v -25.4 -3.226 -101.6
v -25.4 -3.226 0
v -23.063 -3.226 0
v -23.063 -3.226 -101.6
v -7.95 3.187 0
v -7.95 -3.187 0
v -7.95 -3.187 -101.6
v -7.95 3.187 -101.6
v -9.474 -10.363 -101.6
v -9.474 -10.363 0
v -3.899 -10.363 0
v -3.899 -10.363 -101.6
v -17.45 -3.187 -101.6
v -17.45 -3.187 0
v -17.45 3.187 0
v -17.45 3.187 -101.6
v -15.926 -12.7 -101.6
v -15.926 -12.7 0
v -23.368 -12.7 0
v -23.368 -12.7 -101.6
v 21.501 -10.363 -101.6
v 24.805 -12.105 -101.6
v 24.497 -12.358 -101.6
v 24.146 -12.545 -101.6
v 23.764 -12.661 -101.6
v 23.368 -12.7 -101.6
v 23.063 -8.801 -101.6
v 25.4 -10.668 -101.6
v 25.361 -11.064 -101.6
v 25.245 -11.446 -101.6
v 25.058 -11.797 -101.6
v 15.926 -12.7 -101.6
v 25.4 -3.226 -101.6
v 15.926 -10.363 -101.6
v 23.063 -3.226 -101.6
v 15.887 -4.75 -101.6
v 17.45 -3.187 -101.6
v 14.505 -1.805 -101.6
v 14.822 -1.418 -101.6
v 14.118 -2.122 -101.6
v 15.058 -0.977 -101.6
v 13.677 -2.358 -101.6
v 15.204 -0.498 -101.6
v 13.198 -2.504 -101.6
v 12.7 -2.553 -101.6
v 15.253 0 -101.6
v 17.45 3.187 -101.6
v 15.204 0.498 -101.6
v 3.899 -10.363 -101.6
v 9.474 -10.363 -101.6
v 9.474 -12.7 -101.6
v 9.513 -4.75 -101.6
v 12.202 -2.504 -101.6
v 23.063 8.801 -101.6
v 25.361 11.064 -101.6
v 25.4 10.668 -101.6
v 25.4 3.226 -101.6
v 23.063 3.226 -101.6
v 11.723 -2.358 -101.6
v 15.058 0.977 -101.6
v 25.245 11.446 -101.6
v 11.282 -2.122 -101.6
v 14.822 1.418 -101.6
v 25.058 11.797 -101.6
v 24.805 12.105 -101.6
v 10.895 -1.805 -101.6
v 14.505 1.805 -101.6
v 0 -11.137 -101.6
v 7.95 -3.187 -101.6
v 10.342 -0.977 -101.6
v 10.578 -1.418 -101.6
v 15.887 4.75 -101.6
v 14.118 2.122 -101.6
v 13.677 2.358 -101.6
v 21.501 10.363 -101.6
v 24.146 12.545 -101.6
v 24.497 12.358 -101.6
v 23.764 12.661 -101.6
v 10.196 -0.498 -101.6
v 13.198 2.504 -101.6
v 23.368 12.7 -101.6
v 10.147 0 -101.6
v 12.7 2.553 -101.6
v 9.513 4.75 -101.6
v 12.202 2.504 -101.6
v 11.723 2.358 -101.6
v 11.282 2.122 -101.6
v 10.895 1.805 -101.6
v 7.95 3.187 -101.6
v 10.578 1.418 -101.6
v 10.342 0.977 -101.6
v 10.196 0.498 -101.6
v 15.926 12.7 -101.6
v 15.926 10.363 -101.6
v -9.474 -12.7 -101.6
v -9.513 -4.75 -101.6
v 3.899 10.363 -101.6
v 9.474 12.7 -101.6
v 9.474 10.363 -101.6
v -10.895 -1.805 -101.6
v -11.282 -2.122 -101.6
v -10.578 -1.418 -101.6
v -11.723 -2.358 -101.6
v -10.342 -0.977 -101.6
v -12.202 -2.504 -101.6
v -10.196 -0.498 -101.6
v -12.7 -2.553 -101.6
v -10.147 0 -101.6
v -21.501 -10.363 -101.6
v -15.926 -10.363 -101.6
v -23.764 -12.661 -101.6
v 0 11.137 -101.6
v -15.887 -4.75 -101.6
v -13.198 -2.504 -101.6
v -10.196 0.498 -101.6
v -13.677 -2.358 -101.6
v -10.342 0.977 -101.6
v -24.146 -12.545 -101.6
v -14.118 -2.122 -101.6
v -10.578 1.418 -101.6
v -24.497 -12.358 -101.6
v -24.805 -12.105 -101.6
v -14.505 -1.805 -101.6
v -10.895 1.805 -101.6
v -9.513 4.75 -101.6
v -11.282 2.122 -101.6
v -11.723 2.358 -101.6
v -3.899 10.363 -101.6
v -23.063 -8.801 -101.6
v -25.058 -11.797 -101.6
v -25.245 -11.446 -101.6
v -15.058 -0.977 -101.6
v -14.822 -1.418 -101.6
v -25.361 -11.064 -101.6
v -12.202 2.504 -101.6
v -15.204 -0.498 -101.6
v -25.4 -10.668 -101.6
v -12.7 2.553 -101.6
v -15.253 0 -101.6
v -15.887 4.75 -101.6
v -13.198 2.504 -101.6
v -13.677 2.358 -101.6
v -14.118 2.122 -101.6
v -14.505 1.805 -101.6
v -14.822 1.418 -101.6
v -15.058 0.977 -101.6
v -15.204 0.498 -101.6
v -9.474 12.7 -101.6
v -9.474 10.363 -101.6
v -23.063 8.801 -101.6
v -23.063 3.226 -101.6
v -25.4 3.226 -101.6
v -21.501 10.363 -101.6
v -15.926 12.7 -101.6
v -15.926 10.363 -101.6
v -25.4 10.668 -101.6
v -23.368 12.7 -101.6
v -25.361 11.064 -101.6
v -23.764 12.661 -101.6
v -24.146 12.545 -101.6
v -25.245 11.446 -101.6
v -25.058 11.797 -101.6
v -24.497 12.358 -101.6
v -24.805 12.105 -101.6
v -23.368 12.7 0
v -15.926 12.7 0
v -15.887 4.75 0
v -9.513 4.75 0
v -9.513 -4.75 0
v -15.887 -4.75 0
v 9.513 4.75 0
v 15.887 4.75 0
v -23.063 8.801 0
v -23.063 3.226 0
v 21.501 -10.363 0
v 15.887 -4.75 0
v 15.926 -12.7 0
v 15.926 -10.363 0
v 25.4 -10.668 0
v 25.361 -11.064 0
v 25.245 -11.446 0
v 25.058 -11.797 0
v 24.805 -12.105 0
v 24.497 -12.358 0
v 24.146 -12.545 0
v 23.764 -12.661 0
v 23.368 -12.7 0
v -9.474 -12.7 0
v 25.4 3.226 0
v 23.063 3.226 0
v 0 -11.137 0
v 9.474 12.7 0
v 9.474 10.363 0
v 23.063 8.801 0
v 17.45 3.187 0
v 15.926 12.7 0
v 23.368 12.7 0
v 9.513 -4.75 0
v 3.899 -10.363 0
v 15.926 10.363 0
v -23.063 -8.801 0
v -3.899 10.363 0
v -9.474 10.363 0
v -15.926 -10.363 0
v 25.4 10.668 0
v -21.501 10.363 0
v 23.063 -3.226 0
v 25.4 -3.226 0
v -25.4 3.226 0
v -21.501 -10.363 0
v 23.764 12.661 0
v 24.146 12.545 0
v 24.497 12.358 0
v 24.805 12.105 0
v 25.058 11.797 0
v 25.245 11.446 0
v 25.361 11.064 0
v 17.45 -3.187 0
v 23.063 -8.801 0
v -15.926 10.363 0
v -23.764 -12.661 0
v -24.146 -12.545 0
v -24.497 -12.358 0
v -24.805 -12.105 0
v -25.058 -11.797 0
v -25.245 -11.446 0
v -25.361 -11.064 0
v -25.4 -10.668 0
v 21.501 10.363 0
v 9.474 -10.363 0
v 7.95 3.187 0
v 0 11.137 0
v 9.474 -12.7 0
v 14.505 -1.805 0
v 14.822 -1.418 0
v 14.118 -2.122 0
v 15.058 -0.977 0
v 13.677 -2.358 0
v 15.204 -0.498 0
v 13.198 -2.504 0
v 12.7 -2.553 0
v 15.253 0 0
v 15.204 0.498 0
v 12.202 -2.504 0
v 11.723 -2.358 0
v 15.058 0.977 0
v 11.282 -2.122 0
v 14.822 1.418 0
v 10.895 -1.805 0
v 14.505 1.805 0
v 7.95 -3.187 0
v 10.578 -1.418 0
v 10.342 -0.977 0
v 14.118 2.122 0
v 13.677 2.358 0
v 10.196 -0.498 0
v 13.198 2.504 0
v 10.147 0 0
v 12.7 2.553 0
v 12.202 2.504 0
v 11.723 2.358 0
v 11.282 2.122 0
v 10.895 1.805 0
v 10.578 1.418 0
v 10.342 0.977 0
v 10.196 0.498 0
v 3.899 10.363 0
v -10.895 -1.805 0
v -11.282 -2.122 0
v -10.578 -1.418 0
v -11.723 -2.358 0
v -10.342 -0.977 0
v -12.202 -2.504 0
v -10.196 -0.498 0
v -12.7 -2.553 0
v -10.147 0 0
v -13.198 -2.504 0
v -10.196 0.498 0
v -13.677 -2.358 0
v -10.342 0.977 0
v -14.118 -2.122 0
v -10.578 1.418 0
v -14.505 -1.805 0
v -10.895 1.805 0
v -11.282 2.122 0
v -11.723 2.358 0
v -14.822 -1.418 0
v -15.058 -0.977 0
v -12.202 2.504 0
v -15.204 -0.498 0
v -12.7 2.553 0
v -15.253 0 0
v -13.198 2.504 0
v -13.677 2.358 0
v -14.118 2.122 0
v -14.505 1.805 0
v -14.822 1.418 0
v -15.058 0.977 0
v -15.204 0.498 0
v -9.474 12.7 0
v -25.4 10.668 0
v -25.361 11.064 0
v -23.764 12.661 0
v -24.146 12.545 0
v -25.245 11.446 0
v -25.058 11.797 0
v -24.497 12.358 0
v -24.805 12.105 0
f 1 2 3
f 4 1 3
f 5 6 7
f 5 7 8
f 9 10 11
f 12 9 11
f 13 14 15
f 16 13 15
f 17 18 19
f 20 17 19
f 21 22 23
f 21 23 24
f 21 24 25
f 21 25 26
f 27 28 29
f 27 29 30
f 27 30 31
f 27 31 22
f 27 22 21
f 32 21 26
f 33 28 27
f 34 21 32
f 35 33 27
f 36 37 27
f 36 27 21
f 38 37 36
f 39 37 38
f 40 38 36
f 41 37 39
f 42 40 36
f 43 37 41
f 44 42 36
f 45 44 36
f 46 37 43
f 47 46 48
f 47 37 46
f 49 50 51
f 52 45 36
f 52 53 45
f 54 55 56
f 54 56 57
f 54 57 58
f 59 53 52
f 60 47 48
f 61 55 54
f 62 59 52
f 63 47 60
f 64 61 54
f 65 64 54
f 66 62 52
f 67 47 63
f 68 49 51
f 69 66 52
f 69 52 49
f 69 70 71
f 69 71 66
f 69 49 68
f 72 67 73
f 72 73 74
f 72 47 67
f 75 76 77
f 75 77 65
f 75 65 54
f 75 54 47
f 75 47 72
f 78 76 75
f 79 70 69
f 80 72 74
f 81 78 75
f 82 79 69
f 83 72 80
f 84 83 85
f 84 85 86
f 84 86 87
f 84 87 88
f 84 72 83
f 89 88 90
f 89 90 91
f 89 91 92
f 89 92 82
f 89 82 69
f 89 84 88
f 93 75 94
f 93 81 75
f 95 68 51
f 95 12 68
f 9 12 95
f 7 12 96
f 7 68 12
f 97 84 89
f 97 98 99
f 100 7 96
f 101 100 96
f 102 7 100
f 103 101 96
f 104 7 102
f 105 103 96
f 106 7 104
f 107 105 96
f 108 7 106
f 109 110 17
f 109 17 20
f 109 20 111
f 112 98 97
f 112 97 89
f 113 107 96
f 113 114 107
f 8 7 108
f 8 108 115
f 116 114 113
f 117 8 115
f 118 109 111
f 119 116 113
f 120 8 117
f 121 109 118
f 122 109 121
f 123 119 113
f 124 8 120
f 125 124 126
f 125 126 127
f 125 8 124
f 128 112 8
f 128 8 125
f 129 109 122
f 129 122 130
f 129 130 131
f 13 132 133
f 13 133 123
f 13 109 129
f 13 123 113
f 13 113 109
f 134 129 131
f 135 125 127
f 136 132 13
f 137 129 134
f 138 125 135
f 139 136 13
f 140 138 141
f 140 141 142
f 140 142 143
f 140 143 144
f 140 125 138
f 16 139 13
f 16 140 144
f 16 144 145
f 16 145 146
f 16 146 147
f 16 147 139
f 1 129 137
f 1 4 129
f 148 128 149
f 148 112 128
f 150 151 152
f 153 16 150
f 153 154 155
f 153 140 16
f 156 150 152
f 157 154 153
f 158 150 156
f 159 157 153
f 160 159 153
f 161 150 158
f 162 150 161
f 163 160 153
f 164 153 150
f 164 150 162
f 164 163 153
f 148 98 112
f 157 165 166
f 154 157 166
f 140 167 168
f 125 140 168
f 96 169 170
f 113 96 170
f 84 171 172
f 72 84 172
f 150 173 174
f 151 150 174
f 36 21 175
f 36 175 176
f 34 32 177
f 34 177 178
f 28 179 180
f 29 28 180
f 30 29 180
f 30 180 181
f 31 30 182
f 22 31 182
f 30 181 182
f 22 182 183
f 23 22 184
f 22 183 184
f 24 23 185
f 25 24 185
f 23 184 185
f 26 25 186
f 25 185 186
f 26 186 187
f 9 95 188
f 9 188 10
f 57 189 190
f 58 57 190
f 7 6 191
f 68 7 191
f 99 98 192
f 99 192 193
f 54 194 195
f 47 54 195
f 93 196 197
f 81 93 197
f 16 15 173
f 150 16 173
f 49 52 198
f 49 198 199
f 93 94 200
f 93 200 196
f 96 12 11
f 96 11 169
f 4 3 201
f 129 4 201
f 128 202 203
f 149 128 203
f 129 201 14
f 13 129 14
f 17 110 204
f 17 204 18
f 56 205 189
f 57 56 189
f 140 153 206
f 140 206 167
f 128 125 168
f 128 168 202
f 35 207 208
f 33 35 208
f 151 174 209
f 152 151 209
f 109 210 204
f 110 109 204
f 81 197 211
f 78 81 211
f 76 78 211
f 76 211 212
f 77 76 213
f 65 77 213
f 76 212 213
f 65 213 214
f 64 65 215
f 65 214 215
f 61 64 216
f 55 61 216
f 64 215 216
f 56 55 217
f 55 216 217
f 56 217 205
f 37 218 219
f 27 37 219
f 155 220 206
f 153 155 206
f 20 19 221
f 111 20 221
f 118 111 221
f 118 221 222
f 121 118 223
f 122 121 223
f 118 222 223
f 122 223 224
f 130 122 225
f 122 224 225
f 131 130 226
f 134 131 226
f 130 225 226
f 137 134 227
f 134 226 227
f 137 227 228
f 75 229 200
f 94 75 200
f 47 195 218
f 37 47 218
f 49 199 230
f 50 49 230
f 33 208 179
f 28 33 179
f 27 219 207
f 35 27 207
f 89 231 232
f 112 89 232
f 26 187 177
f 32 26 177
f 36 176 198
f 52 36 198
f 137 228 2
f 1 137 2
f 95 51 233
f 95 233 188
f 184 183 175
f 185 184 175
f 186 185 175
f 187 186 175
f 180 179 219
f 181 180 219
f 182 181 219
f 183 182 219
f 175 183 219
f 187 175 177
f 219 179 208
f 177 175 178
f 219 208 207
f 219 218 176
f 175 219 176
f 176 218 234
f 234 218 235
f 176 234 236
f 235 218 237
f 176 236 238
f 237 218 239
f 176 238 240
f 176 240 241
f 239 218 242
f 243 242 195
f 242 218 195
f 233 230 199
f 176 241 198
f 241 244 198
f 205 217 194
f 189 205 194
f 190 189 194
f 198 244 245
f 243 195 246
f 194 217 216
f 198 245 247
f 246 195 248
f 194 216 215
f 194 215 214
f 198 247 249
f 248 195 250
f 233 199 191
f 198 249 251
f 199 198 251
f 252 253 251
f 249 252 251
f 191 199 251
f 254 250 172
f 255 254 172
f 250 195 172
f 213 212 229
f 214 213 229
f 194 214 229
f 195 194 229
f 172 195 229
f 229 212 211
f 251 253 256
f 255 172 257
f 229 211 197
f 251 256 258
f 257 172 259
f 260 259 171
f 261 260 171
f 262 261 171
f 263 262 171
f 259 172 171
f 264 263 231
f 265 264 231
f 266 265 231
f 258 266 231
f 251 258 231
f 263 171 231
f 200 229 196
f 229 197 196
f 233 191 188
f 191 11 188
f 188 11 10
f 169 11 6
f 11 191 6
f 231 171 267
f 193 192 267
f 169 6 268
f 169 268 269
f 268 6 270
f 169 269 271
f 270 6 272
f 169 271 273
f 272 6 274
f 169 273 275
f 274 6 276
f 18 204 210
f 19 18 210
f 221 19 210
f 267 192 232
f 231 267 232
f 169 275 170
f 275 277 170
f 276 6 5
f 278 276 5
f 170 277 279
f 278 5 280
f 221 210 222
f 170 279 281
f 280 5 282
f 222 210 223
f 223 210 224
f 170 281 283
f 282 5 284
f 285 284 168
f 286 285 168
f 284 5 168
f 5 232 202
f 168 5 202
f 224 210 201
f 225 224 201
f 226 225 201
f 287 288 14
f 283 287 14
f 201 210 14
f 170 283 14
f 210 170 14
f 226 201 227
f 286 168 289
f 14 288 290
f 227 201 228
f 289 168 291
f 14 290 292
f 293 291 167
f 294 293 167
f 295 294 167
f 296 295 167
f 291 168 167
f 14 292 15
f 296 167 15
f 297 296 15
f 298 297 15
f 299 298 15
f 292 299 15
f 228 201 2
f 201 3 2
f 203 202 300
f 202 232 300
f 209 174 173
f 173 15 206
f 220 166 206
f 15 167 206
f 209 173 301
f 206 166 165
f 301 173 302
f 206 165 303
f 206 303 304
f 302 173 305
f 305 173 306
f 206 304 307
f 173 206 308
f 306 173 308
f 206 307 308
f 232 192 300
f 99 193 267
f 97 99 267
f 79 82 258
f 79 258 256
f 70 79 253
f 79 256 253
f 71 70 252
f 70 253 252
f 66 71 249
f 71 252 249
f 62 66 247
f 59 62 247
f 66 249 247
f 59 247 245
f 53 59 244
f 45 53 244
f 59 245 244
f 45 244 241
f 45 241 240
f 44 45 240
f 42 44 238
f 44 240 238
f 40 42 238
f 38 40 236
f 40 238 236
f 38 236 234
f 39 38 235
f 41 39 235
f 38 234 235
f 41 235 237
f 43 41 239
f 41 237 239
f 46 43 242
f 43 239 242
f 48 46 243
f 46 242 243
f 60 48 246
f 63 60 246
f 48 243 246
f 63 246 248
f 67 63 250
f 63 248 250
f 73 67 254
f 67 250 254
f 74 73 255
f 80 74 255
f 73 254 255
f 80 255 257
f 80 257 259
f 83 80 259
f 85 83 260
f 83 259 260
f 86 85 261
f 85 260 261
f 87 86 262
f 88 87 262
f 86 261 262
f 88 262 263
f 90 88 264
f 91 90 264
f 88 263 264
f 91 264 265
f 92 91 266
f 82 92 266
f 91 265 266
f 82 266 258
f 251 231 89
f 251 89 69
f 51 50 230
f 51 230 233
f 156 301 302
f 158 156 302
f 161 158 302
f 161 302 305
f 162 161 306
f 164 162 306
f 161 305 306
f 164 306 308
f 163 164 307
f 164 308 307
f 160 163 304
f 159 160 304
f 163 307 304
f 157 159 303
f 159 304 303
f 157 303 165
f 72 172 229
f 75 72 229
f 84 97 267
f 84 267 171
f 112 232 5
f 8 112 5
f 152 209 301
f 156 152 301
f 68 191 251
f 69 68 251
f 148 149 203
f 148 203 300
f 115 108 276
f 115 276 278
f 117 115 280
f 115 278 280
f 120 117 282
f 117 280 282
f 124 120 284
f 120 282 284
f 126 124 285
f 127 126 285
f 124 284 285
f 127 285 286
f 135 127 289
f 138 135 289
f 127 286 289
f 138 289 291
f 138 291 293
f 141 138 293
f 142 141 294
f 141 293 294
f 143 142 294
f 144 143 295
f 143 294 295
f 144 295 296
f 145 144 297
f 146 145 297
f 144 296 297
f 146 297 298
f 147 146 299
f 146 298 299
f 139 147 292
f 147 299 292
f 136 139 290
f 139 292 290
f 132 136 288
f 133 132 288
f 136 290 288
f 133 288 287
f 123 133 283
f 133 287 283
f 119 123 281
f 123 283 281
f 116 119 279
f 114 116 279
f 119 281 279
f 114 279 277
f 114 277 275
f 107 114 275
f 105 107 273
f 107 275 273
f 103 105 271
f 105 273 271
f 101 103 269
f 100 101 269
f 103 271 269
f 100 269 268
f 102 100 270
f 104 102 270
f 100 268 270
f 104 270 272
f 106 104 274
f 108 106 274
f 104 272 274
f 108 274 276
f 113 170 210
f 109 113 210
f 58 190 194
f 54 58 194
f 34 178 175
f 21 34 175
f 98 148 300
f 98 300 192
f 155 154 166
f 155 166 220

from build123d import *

# Parameters (mm, degrees)
SKETCH1_R      = 2.5527
FINALCUT_DEPTH = 101.6


with BuildPart() as part:
    # Sketch1 → FinalCut (new body)
    with BuildSketch(Plane.XY):
        with BuildLine():
            Line((-17.4498, 0), (-17.4498, 3.187235435))
            Line((-17.4498, 3.187235435), (-23.0632, 8.800635435))
            Line((-23.0632, 8.800635435), (-23.0632, 3.2258))
            Line((-23.0632, 3.2258), (-25.4, 3.2258))
            Line((-25.4, 3.2258), (-25.4, 10.668))
            ThreePointArc((-25.4, 10.668), (-24.804840979, 12.104840979), (-23.368, 12.7))
            Line((-23.368, 12.7), (-15.9258, 12.7))
            Line((-15.9258, 12.7), (-15.9258, 10.3632))
            Line((-15.9258, 10.3632), (-21.500635435, 10.3632))
            Line((-21.500635435, 10.3632), (-15.887235435, 4.7498))
            Line((-15.887235435, 4.7498), (-12.7, 4.7498))
            Line((-12.7, 4.7498), (-9.512764565, 4.7498))
            Line((-9.512764565, 4.7498), (-3.899364565, 10.3632))
            Line((-3.899364565, 10.3632), (-9.4742, 10.3632))
            Line((-9.4742, 10.3632), (-9.4742, 12.7))
            Line((-9.4742, 12.7), (9.4742, 12.7))
            Line((9.4742, 12.7), (9.4742, 10.3632))
            Line((9.4742, 10.3632), (3.899364565, 10.3632))
            Line((3.899364565, 10.3632), (9.512764565, 4.7498))
            Line((9.512764565, 4.7498), (15.887235435, 4.7498))
            Line((15.887235435, 4.7498), (21.500635435, 10.3632))
            Line((21.500635435, 10.3632), (15.9258, 10.3632))
            Line((15.9258, 10.3632), (15.9258, 12.7))
            Line((15.9258, 12.7), (23.368, 12.7))
            ThreePointArc((23.368, 12.7), (24.804840979, 12.104840979), (25.4, 10.668))
            Line((25.4, 10.668), (25.4, 3.2258))
            Line((25.4, 3.2258), (23.0632, 3.2258))
            Line((23.0632, 3.2258), (23.0632, 8.800635435))
            Line((23.0632, 8.800635435), (17.4498, 3.187235435))
            Line((17.4498, 3.187235435), (17.4498, 0))
            Line((17.4498, 0), (17.4498, -3.187235435))
            Line((17.4498, -3.187235435), (23.0632, -8.800635435))
            Line((23.0632, -8.800635435), (23.0632, -3.2258))
            Line((23.0632, -3.2258), (25.4, -3.2258))
            Line((25.4, -3.2258), (25.4, -10.668))
            ThreePointArc((25.4, -10.668), (24.804840979, -12.104840979), (23.368, -12.7))
            Line((23.368, -12.7), (15.9258, -12.7))
            Line((15.9258, -12.7), (15.9258, -10.3632))
            Line((15.9258, -10.3632), (21.500635435, -10.3632))
            Line((21.500635435, -10.3632), (15.887235435, -4.7498))
            Line((15.887235435, -4.7498), (12.7, -4.7498))
            Line((12.7, -4.7498), (9.512764565, -4.7498))
            Line((9.512764565, -4.7498), (3.899364565, -10.3632))
            Line((3.899364565, -10.3632), (9.4742, -10.3632))
            Line((9.4742, -10.3632), (9.4742, -12.7))
            Line((9.4742, -12.7), (-9.4742, -12.7))
            Line((-9.4742, -12.7), (-9.4742, -10.3632))
            Line((-9.4742, -10.3632), (-3.899364565, -10.3632))
            Line((-3.899364565, -10.3632), (-9.512764565, -4.7498))
            Line((-9.512764565, -4.7498), (-12.7, -4.7498))
            Line((-12.7, -4.7498), (-15.887235435, -4.7498))
            Line((-15.887235435, -4.7498), (-21.500635435, -10.3632))
            Line((-21.500635435, -10.3632), (-15.9258, -10.3632))
            Line((-15.9258, -10.3632), (-15.9258, -12.7))
            Line((-15.9258, -12.7), (-23.368, -12.7))
            ThreePointArc((-23.368, -12.7), (-24.804840979, -12.104840979), (-25.4, -10.668))
            Line((-25.4, -10.668), (-25.4, -3.2258))
            Line((-25.4, -3.2258), (-23.0632, -3.2258))
            Line((-23.0632, -3.2258), (-23.0632, -8.800635435))
            Line((-23.0632, -8.800635435), (-17.4498, -3.187235435))
            Line((-17.4498, -3.187235435), (-17.4498, 0))
        make_face()
        with Locations((-12.7, 0)):
            Circle(SKETCH1_R, mode=Mode.SUBTRACT)
        with Locations(Location((12.7, 0, 0), (0, 0, 180))):
            Circle(SKETCH1_R, mode=Mode.SUBTRACT)
        Polygon((7.9502, 3.187235435), (0, 11.137435435), (-7.9502, 3.187235435), (-7.9502, 0), (-7.9502, -3.187235435), (0, -11.137435435), (7.9502, -3.187235435), (7.9502, 0), align=None, mode=Mode.SUBTRACT)
    extrude(amount=-FINALCUT_DEPTH)


solid = part.part
